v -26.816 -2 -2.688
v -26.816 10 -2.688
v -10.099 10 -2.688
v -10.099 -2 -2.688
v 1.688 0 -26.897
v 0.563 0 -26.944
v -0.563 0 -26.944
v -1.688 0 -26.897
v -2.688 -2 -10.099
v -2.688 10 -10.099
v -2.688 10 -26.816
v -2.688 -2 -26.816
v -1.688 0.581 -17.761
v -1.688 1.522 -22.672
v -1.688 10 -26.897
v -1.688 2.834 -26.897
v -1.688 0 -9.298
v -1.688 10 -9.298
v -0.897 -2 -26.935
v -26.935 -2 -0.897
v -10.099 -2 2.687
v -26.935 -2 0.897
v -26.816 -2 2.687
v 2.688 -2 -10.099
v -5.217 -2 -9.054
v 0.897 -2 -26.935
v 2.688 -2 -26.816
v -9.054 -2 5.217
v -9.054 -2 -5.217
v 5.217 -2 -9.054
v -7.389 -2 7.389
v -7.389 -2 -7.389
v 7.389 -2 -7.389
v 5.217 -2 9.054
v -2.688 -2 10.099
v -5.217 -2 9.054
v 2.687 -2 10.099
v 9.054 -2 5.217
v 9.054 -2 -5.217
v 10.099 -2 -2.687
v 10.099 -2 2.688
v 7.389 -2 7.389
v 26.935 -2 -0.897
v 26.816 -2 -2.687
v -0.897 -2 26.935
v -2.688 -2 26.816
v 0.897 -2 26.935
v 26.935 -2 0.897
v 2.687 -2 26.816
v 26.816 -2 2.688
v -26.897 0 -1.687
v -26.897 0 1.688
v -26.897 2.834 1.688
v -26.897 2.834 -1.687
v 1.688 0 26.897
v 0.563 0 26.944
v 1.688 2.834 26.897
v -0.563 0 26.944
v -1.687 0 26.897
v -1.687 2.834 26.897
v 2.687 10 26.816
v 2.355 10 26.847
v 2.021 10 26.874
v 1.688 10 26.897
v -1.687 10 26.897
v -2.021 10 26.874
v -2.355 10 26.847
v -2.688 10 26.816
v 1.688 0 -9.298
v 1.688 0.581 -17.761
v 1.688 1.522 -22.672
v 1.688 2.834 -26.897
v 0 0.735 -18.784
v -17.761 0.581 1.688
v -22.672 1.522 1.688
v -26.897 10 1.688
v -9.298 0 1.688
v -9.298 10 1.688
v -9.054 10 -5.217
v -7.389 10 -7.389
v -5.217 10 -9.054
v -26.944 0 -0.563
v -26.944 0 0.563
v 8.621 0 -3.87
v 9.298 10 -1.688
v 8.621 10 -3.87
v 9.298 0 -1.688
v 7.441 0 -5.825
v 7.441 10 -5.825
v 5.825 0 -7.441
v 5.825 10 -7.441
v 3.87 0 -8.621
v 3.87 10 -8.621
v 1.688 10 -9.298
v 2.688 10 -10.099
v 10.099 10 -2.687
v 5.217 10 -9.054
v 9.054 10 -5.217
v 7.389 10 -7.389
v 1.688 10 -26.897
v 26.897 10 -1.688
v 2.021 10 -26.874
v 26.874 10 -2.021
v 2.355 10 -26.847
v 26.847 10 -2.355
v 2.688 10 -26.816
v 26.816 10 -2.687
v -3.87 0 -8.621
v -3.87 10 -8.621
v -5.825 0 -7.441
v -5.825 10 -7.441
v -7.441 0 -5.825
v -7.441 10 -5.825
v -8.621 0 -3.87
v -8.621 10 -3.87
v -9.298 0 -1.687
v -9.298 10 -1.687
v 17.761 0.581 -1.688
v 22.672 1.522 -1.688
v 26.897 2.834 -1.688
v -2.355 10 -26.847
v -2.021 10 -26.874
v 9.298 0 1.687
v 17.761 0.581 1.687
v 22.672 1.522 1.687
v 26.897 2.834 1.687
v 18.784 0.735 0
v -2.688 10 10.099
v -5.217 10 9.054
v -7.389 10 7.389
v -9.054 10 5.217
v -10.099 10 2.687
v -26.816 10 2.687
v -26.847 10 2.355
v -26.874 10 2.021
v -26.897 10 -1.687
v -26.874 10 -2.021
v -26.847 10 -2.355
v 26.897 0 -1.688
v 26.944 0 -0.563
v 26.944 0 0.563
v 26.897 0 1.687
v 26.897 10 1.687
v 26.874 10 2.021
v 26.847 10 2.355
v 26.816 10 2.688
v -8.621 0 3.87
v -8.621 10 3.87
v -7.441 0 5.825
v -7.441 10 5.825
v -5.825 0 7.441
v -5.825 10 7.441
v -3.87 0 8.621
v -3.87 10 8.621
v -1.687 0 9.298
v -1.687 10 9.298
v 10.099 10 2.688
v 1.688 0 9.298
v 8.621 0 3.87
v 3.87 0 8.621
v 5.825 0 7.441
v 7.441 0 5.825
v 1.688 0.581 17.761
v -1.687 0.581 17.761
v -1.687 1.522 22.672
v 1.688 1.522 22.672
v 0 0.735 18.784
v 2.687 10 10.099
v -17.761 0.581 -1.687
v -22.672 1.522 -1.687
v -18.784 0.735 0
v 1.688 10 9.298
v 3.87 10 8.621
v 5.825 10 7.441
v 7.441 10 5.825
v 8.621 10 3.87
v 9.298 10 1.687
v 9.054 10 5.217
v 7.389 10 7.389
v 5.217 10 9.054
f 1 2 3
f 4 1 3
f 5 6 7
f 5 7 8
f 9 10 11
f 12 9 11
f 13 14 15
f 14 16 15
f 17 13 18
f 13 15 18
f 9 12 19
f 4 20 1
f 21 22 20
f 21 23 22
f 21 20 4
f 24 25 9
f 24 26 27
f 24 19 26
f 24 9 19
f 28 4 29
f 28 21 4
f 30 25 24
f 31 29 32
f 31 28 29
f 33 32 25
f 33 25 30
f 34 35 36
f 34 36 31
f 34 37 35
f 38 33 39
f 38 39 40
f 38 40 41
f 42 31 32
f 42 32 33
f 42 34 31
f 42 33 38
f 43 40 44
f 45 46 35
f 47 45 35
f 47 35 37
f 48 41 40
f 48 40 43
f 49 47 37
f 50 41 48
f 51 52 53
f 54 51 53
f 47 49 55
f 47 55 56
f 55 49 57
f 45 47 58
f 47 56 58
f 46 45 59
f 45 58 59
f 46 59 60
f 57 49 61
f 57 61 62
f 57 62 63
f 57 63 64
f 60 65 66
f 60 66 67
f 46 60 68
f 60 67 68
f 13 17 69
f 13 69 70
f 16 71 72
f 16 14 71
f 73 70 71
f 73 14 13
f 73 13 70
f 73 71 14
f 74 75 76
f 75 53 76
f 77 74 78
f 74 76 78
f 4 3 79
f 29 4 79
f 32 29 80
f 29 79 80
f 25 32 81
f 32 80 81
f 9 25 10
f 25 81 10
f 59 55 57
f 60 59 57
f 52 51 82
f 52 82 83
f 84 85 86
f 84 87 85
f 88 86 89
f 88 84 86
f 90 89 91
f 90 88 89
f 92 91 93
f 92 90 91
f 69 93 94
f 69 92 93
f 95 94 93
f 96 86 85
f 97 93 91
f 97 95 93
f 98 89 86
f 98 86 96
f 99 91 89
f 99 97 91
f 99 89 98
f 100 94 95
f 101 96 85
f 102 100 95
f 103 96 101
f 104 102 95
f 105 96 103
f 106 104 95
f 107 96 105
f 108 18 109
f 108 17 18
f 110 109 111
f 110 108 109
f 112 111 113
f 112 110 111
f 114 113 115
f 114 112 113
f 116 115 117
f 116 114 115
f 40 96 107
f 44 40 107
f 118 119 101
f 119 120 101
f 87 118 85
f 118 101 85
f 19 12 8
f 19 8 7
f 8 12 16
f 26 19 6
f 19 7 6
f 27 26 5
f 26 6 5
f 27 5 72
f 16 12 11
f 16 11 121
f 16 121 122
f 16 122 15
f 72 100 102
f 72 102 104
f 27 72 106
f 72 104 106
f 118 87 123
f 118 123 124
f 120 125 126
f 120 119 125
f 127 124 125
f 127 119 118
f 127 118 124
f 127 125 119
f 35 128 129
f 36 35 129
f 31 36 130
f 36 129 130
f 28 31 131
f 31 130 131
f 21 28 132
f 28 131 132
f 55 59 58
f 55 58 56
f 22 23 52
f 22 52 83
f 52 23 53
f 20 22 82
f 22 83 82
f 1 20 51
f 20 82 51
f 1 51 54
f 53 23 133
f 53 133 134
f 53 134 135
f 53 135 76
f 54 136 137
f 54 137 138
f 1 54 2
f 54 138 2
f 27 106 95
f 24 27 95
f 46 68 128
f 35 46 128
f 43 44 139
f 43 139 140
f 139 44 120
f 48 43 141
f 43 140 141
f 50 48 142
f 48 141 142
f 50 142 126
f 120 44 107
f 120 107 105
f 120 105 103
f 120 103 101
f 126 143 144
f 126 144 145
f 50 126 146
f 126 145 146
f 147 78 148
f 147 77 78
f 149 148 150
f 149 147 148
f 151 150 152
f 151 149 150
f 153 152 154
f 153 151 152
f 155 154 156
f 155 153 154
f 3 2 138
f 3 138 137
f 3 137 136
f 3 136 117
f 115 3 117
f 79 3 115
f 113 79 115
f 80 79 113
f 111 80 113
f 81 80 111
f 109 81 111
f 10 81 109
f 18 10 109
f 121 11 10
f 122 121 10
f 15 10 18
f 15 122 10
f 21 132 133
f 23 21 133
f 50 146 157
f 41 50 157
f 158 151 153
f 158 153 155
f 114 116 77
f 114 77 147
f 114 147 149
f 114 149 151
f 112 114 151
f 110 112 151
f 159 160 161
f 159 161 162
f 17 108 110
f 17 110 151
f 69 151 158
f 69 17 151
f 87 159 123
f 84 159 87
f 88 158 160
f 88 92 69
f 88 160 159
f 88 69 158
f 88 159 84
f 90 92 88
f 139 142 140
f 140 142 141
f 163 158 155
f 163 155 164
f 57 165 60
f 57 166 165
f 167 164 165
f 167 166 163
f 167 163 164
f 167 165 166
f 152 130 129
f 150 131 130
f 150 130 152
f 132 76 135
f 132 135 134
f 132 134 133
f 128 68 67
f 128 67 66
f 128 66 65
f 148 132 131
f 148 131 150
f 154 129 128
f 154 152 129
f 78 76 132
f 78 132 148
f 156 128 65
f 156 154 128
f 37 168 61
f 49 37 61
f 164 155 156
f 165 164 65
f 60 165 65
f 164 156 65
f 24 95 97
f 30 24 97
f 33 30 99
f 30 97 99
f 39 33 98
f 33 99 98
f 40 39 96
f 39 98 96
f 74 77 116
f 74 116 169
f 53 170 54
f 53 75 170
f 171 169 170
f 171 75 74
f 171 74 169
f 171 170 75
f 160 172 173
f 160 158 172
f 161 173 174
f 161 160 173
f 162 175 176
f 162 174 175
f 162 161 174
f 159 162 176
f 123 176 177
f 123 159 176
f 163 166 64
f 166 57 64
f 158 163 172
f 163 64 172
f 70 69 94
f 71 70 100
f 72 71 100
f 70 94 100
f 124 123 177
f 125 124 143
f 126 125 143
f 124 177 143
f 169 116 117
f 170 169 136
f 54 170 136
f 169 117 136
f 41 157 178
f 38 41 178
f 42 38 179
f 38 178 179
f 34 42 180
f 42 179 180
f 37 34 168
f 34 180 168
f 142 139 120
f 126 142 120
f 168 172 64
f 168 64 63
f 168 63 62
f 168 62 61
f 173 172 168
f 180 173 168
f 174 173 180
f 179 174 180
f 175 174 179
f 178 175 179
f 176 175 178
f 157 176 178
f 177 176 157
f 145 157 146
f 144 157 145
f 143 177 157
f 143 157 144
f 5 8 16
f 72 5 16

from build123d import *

# Parameters (mm, degrees)
SKETCH2_R           = 26.95
SKETCH2_R_2         = 9.45
BOSS_EXTRUDE2_DEPTH = 10
SKETCH3_R           = 26.95
BOSS_EXTRUDE3_DEPTH = 2
CUT_EXTRUDE1_DEPTH  = 10
BOSS_EXTRUDE4_DEPTH = 3.375
CIRPATTERN1_COUNT   = 4
CUT_EXTRUDE2_DEPTH  = 12
CIRPATTERN2_COUNT   = 4


with BuildPart() as part:
    # Sketch2 → Boss-Extrude2 (new body)
    with BuildSketch(Plane(origin=(0, 0, 0), x_dir=(1, 0, 0), z_dir=(0, 1, 0))):
        Circle(SKETCH2_R)
        Circle(SKETCH2_R_2, mode=Mode.SUBTRACT)
    extrude(amount=BOSS_EXTRUDE2_DEPTH)

    # Sketch3 → Boss-Extrude3 (add)
    with BuildSketch(Plane.XZ):
        Circle(SKETCH3_R)
    extrude(amount=BOSS_EXTRUDE3_DEPTH)

    # Sketch4 → Cut-Extrude1 (cut)
    with BuildSketch(Plane(origin=(0, 10, 0), x_dir=(1, 0, 0), z_dir=(0, 1, 0))):
        with BuildLine():
            Line((-1.6875, 26.8971159), (-1.6875, 9.298109687))
            ThreePointArc((-1.6875, 9.298109687), (0, 9.45), (1.6875, 9.298109687))
            Line((1.6875, 9.298109687), (1.6875, 26.8971159))
            ThreePointArc((1.6875, 26.8971159), (0, 26.95), (-1.6875, 26.8971159))
        make_face()
    cut_extrude1 = extrude(amount=-CUT_EXTRUDE1_DEPTH, mode=Mode.SUBTRACT)

    # Sketch7 → Boss-Extrude4 (add)
    with BuildSketch(Plane(origin=(-1.6875, 0, 0), x_dir=(0, 0, -1), z_dir=(1, 0, 0))):
        with BuildLine():
            Line((26.8971159, 0), (26.8971159, 2.834046352))
            add(Edge.make_bspline(
                [(9.298109687, 0), (19.523797501, 0), (26.8971159, 2.834046352)],
                knots=[4.71238898, 4.71238898, 4.71238898, 5.477856607, 5.477856607, 5.477856607], degree=2, weights=[1, 0.927647139, 1]))
            Line((9.298109687, 0), (26.8971159, 0))
        make_face()
    boss_extrude4 = extrude(amount=BOSS_EXTRUDE4_DEPTH)

    # CirPattern1: Cut-Extrude1, Boss-Extrude4 ×4 about axis
    cirpattern1_axis = Axis((0, 10, 0), (0, -1, 0))
    for i in range(1, CIRPATTERN1_COUNT):
        add(cut_extrude1.rotate(cirpattern1_axis, i * 360 / CIRPATTERN1_COUNT), mode=Mode.SUBTRACT)
        add(boss_extrude4.rotate(cirpattern1_axis, i * 360 / CIRPATTERN1_COUNT))

    # Sketch6 → Cut-Extrude2 (cut)
    with BuildSketch(Plane(origin=(0, 10, 0), x_dir=(1, 0, 0), z_dir=(0, 1, 0))):
        with BuildLine():
            Line((-26.815664149, 2.6875), (-10.098507006, 2.6875))
            ThreePointArc((-10.098507006, 2.6875), (-7.389265863, 7.389265863), (-2.6875, 10.098507006))
            Line((-2.6875, 10.098507006), (-2.6875, 26.815664149))
            ThreePointArc((-2.6875, 26.815664149), (-19.056527753, 19.056527753), (-26.815664149, 2.6875))
        make_face()
    cut_extrude2 = extrude(amount=-CUT_EXTRUDE2_DEPTH, mode=Mode.SUBTRACT)

    # CirPattern2: Cut-Extrude2 ×4 about axis
    cirpattern2_axis = Axis((0, 0, 0), (0, 1, 0))
    for i in range(1, CIRPATTERN2_COUNT):
        add(cut_extrude2.rotate(cirpattern2_axis, i * 360 / CIRPATTERN2_COUNT), mode=Mode.SUBTRACT)


solid = part.part
